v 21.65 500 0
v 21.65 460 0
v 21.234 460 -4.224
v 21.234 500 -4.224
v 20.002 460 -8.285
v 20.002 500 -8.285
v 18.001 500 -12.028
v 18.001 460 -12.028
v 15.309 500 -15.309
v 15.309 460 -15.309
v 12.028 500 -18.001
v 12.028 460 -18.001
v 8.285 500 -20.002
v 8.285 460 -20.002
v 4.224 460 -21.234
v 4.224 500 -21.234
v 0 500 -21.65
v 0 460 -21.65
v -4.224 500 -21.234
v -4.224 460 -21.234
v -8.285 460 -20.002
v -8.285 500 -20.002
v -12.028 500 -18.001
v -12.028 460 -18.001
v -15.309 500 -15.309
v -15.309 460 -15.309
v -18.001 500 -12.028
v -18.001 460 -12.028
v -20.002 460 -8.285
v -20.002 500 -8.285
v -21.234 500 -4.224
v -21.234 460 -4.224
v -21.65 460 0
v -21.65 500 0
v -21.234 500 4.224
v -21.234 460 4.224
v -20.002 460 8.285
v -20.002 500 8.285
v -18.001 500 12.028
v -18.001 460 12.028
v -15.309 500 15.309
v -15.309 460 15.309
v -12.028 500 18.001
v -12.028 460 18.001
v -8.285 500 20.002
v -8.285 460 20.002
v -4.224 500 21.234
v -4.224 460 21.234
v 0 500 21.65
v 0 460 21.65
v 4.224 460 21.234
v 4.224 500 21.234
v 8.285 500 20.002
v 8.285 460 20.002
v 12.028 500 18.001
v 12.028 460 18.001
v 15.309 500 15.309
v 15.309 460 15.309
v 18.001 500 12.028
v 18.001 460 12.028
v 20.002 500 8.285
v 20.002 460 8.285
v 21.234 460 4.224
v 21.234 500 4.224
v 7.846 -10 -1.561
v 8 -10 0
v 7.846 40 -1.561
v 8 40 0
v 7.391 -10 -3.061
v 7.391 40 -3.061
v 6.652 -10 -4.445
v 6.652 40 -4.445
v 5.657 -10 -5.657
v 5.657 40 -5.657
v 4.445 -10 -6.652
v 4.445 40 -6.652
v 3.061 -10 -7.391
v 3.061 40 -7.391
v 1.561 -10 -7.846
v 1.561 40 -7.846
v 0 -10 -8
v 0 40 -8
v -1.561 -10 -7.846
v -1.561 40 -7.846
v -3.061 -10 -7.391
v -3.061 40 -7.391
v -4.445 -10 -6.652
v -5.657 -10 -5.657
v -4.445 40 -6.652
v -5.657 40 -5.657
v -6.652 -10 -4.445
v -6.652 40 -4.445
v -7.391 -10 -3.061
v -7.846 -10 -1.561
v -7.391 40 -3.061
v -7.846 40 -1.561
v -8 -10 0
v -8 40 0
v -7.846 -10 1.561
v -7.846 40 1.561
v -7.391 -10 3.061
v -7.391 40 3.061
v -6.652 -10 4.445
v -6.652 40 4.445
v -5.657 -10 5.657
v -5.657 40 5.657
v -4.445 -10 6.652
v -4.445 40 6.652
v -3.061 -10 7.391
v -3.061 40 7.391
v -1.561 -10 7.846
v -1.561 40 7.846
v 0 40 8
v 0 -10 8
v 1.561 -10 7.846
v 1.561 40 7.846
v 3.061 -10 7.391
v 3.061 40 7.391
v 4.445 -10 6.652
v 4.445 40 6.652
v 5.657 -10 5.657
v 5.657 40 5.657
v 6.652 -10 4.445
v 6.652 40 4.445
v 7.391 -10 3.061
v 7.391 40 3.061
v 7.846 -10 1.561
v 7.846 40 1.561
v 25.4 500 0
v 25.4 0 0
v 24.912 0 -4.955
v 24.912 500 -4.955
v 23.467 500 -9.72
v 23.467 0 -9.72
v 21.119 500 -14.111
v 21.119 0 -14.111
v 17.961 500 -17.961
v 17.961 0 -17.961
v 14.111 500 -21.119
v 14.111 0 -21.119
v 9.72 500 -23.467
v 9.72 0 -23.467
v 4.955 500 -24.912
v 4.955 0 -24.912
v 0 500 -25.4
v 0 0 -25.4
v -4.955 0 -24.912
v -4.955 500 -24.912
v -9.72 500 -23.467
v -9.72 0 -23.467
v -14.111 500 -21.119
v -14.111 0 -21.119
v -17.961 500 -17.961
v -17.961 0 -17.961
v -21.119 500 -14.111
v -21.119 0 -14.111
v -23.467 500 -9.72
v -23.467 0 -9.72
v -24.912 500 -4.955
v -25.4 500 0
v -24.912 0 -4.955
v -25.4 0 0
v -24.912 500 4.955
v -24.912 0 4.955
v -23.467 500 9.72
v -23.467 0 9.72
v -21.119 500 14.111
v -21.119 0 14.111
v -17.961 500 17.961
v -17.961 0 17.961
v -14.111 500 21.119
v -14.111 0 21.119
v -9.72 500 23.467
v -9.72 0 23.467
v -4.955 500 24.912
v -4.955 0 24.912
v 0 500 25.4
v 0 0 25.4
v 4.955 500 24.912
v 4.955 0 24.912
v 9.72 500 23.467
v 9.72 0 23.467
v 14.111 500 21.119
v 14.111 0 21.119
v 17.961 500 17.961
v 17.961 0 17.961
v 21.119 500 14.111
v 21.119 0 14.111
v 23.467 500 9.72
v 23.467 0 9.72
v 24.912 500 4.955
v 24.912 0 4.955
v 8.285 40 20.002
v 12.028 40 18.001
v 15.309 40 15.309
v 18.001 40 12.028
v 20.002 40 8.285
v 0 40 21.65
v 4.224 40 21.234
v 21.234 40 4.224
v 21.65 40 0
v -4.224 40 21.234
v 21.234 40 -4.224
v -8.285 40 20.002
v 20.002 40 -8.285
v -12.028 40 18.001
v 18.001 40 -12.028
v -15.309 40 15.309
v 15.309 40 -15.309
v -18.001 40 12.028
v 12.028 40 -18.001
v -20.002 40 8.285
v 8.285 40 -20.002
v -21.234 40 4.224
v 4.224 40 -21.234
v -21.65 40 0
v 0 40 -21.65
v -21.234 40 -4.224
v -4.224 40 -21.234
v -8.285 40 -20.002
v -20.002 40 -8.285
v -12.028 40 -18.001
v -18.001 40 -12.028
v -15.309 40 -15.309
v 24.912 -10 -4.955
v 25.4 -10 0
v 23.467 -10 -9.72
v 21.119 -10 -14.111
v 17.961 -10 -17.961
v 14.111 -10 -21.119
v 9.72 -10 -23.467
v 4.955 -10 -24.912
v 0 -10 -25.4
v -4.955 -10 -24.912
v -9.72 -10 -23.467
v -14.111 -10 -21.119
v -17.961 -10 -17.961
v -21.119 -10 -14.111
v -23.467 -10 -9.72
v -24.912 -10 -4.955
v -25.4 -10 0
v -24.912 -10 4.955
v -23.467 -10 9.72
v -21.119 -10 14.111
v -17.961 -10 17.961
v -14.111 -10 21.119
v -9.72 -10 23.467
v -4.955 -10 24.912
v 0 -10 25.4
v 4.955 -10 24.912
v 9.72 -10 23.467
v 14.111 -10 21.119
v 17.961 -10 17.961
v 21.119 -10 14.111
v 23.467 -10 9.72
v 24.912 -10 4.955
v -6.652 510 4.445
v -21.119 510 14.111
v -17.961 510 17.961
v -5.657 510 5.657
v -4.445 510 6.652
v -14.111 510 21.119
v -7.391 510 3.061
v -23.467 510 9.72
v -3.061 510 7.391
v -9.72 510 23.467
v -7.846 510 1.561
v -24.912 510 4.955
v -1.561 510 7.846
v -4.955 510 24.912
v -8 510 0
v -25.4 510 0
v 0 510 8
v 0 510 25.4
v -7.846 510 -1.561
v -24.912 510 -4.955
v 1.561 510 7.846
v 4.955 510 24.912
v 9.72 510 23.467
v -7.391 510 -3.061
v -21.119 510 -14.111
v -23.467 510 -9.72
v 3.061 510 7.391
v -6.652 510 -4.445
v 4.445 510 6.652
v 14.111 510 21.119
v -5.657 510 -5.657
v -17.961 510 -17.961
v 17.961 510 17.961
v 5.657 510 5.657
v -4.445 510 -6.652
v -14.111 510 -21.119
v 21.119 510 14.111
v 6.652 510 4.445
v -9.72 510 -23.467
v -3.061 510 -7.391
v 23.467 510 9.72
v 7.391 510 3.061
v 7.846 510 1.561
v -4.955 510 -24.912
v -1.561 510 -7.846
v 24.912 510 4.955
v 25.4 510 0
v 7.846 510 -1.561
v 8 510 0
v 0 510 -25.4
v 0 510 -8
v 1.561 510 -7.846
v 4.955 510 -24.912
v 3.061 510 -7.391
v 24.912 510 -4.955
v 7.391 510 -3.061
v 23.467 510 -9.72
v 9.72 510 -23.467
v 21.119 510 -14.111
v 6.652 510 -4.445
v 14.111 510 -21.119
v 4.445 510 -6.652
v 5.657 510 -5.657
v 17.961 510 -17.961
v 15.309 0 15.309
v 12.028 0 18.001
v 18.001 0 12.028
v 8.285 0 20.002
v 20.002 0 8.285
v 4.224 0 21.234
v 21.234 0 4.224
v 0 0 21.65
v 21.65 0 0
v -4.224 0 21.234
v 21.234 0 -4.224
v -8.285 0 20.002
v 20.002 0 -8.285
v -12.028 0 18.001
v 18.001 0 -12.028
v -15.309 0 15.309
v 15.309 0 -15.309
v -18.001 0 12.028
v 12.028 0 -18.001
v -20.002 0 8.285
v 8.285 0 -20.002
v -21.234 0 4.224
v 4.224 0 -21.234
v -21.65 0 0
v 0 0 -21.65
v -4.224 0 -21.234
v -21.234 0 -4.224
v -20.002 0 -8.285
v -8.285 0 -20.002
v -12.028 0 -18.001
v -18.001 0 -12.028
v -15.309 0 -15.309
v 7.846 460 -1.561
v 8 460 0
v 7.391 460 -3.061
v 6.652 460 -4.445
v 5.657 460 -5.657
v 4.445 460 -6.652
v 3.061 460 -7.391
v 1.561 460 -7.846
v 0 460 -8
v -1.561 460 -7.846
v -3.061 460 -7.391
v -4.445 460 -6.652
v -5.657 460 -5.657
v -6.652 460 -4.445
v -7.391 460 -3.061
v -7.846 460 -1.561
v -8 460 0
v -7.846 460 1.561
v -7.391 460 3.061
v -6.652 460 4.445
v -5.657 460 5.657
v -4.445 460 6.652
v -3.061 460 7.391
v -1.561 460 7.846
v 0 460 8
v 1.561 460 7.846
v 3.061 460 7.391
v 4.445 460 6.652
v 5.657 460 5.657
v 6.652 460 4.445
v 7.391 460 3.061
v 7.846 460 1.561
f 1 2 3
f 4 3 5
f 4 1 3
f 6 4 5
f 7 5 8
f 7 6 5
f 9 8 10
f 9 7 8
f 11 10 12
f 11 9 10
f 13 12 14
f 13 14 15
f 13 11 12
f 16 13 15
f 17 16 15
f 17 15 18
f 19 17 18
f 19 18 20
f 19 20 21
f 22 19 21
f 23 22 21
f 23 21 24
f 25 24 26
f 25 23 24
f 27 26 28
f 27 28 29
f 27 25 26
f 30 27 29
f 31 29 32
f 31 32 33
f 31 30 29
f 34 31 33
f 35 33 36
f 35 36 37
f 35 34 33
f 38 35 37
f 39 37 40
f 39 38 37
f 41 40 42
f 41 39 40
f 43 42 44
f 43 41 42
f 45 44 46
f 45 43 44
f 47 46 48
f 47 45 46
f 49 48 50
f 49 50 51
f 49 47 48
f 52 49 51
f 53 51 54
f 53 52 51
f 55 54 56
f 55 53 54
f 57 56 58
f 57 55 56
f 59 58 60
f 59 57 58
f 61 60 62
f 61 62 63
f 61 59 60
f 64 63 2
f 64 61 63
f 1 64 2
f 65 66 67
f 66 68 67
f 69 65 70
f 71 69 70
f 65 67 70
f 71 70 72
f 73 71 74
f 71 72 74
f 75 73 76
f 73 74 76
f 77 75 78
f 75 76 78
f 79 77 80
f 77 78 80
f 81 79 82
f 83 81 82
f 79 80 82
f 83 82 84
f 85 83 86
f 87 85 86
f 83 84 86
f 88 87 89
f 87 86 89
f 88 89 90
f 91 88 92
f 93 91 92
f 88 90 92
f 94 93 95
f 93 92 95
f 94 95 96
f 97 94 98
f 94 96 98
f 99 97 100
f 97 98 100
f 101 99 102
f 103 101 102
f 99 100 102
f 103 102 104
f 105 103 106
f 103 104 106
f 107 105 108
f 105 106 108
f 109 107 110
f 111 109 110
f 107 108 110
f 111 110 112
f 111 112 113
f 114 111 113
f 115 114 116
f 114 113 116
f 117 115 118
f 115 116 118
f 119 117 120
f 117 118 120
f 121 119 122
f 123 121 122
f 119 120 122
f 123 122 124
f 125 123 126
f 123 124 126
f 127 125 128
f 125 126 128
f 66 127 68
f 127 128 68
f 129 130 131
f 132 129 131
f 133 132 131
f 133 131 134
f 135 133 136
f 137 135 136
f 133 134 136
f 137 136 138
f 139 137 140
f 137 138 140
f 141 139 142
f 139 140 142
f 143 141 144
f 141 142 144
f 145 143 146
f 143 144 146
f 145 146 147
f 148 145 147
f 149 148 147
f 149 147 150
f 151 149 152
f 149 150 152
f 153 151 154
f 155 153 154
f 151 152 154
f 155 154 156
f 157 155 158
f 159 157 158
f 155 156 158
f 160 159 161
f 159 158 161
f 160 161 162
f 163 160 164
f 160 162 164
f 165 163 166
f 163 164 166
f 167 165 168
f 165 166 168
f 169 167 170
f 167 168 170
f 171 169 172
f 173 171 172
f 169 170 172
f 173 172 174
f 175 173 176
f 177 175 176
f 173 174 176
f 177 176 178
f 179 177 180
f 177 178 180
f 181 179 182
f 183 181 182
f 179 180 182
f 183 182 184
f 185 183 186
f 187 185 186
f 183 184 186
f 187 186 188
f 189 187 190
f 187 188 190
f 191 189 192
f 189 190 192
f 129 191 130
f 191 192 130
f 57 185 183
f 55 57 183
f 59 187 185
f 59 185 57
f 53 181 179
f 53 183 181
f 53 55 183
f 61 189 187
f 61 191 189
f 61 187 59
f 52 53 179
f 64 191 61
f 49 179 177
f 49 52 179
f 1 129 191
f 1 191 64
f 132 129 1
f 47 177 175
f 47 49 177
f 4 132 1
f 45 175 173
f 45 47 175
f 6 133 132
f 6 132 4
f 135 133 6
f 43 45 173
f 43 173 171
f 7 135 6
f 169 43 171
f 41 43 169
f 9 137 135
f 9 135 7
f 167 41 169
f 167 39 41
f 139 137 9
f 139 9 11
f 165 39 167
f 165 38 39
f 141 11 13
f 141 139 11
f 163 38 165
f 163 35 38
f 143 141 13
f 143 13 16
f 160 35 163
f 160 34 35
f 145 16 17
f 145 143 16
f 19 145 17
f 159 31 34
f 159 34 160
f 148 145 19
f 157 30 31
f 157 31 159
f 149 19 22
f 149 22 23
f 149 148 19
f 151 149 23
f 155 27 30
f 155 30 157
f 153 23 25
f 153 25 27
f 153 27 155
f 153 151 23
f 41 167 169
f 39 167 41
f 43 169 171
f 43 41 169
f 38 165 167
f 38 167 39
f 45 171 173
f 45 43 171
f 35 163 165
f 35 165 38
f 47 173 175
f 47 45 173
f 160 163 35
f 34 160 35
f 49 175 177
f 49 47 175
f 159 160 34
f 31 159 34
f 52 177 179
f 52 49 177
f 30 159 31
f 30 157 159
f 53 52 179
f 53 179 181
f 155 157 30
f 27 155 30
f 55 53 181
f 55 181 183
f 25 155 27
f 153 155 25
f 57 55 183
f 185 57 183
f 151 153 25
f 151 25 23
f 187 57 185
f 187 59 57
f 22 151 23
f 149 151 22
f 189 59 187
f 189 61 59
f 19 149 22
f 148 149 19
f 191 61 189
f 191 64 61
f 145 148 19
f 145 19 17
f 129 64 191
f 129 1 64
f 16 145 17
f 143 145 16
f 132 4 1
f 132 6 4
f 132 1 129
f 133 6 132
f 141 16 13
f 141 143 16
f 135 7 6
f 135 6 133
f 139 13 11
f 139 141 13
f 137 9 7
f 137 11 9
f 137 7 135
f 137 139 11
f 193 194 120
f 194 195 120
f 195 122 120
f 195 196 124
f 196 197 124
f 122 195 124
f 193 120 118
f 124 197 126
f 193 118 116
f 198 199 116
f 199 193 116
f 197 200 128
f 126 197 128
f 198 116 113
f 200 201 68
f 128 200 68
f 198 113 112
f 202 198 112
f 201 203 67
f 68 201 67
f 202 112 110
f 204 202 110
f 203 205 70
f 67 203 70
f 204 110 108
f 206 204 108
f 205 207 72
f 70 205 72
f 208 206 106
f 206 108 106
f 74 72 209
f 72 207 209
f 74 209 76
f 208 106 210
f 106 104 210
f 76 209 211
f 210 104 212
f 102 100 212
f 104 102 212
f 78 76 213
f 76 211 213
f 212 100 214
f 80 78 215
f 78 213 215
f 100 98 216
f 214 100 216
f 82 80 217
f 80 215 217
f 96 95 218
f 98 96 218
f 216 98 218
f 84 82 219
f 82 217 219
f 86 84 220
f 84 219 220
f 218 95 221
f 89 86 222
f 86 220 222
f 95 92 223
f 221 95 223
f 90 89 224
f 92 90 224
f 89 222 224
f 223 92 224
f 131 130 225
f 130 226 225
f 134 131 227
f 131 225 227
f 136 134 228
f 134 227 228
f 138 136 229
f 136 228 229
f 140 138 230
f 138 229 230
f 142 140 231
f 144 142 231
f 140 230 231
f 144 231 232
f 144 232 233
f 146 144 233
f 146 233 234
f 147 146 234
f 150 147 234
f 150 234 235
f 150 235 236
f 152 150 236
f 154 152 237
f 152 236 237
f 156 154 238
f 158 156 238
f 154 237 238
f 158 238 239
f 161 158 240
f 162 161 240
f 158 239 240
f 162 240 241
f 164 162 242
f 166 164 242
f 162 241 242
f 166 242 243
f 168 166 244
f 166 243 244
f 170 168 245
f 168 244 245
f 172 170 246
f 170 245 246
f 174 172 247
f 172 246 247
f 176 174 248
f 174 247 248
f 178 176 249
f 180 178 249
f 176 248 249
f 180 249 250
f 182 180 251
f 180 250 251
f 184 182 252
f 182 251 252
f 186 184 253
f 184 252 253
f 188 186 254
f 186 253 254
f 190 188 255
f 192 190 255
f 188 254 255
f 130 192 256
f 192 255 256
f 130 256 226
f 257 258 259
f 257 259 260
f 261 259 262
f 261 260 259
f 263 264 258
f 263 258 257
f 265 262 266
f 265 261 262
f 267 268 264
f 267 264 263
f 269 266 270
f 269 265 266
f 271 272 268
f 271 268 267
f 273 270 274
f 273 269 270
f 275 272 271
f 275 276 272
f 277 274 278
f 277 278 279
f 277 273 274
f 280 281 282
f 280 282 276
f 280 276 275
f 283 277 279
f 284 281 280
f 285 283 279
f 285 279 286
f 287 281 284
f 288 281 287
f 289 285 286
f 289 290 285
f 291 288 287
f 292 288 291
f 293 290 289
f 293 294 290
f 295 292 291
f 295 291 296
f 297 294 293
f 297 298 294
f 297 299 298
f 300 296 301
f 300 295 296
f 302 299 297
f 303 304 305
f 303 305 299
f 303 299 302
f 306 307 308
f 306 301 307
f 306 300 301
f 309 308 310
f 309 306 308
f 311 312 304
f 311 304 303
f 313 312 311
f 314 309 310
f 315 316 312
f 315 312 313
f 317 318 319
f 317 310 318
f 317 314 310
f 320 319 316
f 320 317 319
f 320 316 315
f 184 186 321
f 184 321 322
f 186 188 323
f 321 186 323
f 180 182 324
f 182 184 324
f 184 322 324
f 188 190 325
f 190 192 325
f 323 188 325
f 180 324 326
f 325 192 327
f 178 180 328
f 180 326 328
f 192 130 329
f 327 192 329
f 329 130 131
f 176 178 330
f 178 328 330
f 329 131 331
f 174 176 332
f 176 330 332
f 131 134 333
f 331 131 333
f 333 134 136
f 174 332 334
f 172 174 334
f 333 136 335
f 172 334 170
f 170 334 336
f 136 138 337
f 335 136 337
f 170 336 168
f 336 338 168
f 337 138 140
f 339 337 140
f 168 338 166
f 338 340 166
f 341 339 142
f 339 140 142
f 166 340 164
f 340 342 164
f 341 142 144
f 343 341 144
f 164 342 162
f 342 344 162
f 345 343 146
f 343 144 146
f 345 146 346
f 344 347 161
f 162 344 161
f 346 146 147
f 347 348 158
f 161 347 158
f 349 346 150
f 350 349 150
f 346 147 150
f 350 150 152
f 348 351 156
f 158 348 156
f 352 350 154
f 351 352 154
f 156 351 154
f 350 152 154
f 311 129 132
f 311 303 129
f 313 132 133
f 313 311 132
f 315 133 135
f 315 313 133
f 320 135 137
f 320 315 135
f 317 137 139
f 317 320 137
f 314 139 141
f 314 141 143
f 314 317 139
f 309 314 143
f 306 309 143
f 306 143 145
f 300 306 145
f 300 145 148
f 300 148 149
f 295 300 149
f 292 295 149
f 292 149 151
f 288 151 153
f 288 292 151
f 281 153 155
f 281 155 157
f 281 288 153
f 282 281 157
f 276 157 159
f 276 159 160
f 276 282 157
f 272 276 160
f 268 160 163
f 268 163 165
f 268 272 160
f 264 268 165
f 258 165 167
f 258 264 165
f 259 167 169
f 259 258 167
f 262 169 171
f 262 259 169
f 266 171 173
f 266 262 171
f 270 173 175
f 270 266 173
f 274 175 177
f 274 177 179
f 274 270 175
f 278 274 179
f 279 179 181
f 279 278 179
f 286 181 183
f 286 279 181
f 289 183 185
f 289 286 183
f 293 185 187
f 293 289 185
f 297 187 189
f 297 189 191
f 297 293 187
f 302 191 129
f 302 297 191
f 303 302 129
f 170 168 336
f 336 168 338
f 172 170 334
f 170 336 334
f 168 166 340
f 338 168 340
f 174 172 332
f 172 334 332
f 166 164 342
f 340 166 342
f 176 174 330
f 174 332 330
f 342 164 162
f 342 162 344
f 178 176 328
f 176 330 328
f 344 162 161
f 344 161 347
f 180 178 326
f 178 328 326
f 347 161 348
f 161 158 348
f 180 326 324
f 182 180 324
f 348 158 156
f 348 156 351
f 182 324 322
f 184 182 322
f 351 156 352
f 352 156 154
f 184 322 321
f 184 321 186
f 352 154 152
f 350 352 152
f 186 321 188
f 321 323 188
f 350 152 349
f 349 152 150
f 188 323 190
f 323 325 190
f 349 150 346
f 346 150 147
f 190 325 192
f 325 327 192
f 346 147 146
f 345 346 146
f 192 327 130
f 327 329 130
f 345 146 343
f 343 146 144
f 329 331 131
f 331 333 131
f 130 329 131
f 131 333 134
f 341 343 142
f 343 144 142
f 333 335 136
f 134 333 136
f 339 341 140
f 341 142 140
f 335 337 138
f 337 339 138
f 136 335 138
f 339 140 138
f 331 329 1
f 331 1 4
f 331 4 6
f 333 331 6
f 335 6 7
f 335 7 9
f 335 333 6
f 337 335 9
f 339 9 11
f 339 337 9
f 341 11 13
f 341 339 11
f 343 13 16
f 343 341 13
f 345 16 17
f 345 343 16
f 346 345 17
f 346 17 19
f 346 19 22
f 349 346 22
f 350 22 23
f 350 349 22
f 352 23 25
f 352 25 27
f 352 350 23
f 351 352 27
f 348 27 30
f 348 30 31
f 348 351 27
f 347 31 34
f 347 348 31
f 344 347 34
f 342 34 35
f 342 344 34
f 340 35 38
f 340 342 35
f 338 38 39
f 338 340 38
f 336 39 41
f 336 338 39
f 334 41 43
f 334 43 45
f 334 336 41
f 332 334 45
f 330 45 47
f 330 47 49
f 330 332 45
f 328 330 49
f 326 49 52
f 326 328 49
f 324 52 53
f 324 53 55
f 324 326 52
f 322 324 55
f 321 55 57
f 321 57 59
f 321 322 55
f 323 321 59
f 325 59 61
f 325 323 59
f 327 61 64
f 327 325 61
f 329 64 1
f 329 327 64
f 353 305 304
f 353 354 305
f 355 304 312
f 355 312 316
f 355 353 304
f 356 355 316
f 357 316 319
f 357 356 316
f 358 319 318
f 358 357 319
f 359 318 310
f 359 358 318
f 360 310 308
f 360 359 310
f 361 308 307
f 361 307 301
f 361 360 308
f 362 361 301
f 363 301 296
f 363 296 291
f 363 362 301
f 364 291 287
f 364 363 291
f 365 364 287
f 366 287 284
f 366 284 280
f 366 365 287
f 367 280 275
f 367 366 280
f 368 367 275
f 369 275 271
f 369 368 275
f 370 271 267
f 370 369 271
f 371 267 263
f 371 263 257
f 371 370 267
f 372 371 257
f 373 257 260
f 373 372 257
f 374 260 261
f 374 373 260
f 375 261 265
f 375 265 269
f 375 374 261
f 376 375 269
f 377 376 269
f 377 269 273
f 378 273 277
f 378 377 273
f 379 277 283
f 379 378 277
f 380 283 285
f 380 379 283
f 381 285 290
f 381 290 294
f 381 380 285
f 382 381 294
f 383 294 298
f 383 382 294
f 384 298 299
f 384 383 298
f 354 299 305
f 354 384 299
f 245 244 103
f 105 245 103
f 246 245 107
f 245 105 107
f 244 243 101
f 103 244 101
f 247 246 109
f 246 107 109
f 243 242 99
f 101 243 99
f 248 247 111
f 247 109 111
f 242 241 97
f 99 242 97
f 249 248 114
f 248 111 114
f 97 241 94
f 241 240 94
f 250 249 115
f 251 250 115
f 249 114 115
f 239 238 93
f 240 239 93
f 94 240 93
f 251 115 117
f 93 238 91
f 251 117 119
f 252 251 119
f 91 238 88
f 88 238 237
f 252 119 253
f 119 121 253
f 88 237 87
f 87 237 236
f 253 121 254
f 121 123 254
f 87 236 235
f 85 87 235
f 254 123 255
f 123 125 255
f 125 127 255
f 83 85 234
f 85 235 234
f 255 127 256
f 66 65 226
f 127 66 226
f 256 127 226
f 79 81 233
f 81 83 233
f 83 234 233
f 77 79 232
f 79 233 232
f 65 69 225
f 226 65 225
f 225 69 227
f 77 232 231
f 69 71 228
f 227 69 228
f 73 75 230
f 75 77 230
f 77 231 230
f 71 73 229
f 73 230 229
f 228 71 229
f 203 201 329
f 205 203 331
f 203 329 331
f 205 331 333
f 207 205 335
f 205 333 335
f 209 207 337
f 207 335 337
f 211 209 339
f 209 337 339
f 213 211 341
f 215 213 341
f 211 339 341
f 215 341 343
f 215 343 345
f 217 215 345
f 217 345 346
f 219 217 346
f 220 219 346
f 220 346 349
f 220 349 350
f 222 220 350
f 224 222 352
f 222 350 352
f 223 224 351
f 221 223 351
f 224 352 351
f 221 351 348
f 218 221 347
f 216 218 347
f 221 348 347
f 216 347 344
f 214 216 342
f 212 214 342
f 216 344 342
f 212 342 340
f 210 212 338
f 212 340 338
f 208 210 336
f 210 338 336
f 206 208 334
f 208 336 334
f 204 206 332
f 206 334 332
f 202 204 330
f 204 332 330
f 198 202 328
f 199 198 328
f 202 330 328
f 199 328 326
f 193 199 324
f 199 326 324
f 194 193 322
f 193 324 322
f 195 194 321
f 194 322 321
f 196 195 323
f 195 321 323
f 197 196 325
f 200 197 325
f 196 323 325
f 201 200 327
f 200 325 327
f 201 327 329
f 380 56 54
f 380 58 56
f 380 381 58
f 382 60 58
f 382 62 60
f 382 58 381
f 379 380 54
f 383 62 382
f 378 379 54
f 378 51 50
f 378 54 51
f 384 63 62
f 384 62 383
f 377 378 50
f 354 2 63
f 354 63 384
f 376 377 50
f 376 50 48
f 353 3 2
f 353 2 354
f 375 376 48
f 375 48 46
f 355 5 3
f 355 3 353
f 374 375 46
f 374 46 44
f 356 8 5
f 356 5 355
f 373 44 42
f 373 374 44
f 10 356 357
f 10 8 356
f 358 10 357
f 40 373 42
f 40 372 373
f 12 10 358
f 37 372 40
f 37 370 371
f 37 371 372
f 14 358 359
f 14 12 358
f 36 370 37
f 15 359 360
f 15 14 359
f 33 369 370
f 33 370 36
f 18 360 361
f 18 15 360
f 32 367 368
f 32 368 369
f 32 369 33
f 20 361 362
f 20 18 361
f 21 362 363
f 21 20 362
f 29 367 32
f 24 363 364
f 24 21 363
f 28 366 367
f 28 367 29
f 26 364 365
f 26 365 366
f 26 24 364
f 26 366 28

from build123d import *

# Parameters (mm, degrees)
ESBO_O1_R                = 25.4
ESBO_O1_R_2              = 21.65
RESSALTO_EXTRUS_O1_DEPTH = 500


with BuildPart() as part:
    # Esboço1 → Ressalto-extrusão1 (new body)
    with BuildSketch(Plane(origin=(0, 0, 0), x_dir=(1, 0, 0), z_dir=(0, 1, 0))):
        Circle(ESBO_O1_R)
        Circle(ESBO_O1_R_2, mode=Mode.SUBTRACT)
    extrude(amount=RESSALTO_EXTRUS_O1_DEPTH)


with BuildPart() as body_2:
    # Esboço2 → Revolução1 (revolve)
    with BuildSketch(Plane.XY):
        Polygon((25.4, 500), (25.4, 510), (8, 510), (8, 460), (21.65, 460), (21.65, 500), align=None)
        Polygon((8, -10), (8, 40), (21.65, 40), (21.65, 0), (25.4, 0), (25.4, -10), align=None)
    revolve(axis=Axis((0, 0, 0), (0, 1, 0)))


solid = Compound([part.part, body_2.part])
